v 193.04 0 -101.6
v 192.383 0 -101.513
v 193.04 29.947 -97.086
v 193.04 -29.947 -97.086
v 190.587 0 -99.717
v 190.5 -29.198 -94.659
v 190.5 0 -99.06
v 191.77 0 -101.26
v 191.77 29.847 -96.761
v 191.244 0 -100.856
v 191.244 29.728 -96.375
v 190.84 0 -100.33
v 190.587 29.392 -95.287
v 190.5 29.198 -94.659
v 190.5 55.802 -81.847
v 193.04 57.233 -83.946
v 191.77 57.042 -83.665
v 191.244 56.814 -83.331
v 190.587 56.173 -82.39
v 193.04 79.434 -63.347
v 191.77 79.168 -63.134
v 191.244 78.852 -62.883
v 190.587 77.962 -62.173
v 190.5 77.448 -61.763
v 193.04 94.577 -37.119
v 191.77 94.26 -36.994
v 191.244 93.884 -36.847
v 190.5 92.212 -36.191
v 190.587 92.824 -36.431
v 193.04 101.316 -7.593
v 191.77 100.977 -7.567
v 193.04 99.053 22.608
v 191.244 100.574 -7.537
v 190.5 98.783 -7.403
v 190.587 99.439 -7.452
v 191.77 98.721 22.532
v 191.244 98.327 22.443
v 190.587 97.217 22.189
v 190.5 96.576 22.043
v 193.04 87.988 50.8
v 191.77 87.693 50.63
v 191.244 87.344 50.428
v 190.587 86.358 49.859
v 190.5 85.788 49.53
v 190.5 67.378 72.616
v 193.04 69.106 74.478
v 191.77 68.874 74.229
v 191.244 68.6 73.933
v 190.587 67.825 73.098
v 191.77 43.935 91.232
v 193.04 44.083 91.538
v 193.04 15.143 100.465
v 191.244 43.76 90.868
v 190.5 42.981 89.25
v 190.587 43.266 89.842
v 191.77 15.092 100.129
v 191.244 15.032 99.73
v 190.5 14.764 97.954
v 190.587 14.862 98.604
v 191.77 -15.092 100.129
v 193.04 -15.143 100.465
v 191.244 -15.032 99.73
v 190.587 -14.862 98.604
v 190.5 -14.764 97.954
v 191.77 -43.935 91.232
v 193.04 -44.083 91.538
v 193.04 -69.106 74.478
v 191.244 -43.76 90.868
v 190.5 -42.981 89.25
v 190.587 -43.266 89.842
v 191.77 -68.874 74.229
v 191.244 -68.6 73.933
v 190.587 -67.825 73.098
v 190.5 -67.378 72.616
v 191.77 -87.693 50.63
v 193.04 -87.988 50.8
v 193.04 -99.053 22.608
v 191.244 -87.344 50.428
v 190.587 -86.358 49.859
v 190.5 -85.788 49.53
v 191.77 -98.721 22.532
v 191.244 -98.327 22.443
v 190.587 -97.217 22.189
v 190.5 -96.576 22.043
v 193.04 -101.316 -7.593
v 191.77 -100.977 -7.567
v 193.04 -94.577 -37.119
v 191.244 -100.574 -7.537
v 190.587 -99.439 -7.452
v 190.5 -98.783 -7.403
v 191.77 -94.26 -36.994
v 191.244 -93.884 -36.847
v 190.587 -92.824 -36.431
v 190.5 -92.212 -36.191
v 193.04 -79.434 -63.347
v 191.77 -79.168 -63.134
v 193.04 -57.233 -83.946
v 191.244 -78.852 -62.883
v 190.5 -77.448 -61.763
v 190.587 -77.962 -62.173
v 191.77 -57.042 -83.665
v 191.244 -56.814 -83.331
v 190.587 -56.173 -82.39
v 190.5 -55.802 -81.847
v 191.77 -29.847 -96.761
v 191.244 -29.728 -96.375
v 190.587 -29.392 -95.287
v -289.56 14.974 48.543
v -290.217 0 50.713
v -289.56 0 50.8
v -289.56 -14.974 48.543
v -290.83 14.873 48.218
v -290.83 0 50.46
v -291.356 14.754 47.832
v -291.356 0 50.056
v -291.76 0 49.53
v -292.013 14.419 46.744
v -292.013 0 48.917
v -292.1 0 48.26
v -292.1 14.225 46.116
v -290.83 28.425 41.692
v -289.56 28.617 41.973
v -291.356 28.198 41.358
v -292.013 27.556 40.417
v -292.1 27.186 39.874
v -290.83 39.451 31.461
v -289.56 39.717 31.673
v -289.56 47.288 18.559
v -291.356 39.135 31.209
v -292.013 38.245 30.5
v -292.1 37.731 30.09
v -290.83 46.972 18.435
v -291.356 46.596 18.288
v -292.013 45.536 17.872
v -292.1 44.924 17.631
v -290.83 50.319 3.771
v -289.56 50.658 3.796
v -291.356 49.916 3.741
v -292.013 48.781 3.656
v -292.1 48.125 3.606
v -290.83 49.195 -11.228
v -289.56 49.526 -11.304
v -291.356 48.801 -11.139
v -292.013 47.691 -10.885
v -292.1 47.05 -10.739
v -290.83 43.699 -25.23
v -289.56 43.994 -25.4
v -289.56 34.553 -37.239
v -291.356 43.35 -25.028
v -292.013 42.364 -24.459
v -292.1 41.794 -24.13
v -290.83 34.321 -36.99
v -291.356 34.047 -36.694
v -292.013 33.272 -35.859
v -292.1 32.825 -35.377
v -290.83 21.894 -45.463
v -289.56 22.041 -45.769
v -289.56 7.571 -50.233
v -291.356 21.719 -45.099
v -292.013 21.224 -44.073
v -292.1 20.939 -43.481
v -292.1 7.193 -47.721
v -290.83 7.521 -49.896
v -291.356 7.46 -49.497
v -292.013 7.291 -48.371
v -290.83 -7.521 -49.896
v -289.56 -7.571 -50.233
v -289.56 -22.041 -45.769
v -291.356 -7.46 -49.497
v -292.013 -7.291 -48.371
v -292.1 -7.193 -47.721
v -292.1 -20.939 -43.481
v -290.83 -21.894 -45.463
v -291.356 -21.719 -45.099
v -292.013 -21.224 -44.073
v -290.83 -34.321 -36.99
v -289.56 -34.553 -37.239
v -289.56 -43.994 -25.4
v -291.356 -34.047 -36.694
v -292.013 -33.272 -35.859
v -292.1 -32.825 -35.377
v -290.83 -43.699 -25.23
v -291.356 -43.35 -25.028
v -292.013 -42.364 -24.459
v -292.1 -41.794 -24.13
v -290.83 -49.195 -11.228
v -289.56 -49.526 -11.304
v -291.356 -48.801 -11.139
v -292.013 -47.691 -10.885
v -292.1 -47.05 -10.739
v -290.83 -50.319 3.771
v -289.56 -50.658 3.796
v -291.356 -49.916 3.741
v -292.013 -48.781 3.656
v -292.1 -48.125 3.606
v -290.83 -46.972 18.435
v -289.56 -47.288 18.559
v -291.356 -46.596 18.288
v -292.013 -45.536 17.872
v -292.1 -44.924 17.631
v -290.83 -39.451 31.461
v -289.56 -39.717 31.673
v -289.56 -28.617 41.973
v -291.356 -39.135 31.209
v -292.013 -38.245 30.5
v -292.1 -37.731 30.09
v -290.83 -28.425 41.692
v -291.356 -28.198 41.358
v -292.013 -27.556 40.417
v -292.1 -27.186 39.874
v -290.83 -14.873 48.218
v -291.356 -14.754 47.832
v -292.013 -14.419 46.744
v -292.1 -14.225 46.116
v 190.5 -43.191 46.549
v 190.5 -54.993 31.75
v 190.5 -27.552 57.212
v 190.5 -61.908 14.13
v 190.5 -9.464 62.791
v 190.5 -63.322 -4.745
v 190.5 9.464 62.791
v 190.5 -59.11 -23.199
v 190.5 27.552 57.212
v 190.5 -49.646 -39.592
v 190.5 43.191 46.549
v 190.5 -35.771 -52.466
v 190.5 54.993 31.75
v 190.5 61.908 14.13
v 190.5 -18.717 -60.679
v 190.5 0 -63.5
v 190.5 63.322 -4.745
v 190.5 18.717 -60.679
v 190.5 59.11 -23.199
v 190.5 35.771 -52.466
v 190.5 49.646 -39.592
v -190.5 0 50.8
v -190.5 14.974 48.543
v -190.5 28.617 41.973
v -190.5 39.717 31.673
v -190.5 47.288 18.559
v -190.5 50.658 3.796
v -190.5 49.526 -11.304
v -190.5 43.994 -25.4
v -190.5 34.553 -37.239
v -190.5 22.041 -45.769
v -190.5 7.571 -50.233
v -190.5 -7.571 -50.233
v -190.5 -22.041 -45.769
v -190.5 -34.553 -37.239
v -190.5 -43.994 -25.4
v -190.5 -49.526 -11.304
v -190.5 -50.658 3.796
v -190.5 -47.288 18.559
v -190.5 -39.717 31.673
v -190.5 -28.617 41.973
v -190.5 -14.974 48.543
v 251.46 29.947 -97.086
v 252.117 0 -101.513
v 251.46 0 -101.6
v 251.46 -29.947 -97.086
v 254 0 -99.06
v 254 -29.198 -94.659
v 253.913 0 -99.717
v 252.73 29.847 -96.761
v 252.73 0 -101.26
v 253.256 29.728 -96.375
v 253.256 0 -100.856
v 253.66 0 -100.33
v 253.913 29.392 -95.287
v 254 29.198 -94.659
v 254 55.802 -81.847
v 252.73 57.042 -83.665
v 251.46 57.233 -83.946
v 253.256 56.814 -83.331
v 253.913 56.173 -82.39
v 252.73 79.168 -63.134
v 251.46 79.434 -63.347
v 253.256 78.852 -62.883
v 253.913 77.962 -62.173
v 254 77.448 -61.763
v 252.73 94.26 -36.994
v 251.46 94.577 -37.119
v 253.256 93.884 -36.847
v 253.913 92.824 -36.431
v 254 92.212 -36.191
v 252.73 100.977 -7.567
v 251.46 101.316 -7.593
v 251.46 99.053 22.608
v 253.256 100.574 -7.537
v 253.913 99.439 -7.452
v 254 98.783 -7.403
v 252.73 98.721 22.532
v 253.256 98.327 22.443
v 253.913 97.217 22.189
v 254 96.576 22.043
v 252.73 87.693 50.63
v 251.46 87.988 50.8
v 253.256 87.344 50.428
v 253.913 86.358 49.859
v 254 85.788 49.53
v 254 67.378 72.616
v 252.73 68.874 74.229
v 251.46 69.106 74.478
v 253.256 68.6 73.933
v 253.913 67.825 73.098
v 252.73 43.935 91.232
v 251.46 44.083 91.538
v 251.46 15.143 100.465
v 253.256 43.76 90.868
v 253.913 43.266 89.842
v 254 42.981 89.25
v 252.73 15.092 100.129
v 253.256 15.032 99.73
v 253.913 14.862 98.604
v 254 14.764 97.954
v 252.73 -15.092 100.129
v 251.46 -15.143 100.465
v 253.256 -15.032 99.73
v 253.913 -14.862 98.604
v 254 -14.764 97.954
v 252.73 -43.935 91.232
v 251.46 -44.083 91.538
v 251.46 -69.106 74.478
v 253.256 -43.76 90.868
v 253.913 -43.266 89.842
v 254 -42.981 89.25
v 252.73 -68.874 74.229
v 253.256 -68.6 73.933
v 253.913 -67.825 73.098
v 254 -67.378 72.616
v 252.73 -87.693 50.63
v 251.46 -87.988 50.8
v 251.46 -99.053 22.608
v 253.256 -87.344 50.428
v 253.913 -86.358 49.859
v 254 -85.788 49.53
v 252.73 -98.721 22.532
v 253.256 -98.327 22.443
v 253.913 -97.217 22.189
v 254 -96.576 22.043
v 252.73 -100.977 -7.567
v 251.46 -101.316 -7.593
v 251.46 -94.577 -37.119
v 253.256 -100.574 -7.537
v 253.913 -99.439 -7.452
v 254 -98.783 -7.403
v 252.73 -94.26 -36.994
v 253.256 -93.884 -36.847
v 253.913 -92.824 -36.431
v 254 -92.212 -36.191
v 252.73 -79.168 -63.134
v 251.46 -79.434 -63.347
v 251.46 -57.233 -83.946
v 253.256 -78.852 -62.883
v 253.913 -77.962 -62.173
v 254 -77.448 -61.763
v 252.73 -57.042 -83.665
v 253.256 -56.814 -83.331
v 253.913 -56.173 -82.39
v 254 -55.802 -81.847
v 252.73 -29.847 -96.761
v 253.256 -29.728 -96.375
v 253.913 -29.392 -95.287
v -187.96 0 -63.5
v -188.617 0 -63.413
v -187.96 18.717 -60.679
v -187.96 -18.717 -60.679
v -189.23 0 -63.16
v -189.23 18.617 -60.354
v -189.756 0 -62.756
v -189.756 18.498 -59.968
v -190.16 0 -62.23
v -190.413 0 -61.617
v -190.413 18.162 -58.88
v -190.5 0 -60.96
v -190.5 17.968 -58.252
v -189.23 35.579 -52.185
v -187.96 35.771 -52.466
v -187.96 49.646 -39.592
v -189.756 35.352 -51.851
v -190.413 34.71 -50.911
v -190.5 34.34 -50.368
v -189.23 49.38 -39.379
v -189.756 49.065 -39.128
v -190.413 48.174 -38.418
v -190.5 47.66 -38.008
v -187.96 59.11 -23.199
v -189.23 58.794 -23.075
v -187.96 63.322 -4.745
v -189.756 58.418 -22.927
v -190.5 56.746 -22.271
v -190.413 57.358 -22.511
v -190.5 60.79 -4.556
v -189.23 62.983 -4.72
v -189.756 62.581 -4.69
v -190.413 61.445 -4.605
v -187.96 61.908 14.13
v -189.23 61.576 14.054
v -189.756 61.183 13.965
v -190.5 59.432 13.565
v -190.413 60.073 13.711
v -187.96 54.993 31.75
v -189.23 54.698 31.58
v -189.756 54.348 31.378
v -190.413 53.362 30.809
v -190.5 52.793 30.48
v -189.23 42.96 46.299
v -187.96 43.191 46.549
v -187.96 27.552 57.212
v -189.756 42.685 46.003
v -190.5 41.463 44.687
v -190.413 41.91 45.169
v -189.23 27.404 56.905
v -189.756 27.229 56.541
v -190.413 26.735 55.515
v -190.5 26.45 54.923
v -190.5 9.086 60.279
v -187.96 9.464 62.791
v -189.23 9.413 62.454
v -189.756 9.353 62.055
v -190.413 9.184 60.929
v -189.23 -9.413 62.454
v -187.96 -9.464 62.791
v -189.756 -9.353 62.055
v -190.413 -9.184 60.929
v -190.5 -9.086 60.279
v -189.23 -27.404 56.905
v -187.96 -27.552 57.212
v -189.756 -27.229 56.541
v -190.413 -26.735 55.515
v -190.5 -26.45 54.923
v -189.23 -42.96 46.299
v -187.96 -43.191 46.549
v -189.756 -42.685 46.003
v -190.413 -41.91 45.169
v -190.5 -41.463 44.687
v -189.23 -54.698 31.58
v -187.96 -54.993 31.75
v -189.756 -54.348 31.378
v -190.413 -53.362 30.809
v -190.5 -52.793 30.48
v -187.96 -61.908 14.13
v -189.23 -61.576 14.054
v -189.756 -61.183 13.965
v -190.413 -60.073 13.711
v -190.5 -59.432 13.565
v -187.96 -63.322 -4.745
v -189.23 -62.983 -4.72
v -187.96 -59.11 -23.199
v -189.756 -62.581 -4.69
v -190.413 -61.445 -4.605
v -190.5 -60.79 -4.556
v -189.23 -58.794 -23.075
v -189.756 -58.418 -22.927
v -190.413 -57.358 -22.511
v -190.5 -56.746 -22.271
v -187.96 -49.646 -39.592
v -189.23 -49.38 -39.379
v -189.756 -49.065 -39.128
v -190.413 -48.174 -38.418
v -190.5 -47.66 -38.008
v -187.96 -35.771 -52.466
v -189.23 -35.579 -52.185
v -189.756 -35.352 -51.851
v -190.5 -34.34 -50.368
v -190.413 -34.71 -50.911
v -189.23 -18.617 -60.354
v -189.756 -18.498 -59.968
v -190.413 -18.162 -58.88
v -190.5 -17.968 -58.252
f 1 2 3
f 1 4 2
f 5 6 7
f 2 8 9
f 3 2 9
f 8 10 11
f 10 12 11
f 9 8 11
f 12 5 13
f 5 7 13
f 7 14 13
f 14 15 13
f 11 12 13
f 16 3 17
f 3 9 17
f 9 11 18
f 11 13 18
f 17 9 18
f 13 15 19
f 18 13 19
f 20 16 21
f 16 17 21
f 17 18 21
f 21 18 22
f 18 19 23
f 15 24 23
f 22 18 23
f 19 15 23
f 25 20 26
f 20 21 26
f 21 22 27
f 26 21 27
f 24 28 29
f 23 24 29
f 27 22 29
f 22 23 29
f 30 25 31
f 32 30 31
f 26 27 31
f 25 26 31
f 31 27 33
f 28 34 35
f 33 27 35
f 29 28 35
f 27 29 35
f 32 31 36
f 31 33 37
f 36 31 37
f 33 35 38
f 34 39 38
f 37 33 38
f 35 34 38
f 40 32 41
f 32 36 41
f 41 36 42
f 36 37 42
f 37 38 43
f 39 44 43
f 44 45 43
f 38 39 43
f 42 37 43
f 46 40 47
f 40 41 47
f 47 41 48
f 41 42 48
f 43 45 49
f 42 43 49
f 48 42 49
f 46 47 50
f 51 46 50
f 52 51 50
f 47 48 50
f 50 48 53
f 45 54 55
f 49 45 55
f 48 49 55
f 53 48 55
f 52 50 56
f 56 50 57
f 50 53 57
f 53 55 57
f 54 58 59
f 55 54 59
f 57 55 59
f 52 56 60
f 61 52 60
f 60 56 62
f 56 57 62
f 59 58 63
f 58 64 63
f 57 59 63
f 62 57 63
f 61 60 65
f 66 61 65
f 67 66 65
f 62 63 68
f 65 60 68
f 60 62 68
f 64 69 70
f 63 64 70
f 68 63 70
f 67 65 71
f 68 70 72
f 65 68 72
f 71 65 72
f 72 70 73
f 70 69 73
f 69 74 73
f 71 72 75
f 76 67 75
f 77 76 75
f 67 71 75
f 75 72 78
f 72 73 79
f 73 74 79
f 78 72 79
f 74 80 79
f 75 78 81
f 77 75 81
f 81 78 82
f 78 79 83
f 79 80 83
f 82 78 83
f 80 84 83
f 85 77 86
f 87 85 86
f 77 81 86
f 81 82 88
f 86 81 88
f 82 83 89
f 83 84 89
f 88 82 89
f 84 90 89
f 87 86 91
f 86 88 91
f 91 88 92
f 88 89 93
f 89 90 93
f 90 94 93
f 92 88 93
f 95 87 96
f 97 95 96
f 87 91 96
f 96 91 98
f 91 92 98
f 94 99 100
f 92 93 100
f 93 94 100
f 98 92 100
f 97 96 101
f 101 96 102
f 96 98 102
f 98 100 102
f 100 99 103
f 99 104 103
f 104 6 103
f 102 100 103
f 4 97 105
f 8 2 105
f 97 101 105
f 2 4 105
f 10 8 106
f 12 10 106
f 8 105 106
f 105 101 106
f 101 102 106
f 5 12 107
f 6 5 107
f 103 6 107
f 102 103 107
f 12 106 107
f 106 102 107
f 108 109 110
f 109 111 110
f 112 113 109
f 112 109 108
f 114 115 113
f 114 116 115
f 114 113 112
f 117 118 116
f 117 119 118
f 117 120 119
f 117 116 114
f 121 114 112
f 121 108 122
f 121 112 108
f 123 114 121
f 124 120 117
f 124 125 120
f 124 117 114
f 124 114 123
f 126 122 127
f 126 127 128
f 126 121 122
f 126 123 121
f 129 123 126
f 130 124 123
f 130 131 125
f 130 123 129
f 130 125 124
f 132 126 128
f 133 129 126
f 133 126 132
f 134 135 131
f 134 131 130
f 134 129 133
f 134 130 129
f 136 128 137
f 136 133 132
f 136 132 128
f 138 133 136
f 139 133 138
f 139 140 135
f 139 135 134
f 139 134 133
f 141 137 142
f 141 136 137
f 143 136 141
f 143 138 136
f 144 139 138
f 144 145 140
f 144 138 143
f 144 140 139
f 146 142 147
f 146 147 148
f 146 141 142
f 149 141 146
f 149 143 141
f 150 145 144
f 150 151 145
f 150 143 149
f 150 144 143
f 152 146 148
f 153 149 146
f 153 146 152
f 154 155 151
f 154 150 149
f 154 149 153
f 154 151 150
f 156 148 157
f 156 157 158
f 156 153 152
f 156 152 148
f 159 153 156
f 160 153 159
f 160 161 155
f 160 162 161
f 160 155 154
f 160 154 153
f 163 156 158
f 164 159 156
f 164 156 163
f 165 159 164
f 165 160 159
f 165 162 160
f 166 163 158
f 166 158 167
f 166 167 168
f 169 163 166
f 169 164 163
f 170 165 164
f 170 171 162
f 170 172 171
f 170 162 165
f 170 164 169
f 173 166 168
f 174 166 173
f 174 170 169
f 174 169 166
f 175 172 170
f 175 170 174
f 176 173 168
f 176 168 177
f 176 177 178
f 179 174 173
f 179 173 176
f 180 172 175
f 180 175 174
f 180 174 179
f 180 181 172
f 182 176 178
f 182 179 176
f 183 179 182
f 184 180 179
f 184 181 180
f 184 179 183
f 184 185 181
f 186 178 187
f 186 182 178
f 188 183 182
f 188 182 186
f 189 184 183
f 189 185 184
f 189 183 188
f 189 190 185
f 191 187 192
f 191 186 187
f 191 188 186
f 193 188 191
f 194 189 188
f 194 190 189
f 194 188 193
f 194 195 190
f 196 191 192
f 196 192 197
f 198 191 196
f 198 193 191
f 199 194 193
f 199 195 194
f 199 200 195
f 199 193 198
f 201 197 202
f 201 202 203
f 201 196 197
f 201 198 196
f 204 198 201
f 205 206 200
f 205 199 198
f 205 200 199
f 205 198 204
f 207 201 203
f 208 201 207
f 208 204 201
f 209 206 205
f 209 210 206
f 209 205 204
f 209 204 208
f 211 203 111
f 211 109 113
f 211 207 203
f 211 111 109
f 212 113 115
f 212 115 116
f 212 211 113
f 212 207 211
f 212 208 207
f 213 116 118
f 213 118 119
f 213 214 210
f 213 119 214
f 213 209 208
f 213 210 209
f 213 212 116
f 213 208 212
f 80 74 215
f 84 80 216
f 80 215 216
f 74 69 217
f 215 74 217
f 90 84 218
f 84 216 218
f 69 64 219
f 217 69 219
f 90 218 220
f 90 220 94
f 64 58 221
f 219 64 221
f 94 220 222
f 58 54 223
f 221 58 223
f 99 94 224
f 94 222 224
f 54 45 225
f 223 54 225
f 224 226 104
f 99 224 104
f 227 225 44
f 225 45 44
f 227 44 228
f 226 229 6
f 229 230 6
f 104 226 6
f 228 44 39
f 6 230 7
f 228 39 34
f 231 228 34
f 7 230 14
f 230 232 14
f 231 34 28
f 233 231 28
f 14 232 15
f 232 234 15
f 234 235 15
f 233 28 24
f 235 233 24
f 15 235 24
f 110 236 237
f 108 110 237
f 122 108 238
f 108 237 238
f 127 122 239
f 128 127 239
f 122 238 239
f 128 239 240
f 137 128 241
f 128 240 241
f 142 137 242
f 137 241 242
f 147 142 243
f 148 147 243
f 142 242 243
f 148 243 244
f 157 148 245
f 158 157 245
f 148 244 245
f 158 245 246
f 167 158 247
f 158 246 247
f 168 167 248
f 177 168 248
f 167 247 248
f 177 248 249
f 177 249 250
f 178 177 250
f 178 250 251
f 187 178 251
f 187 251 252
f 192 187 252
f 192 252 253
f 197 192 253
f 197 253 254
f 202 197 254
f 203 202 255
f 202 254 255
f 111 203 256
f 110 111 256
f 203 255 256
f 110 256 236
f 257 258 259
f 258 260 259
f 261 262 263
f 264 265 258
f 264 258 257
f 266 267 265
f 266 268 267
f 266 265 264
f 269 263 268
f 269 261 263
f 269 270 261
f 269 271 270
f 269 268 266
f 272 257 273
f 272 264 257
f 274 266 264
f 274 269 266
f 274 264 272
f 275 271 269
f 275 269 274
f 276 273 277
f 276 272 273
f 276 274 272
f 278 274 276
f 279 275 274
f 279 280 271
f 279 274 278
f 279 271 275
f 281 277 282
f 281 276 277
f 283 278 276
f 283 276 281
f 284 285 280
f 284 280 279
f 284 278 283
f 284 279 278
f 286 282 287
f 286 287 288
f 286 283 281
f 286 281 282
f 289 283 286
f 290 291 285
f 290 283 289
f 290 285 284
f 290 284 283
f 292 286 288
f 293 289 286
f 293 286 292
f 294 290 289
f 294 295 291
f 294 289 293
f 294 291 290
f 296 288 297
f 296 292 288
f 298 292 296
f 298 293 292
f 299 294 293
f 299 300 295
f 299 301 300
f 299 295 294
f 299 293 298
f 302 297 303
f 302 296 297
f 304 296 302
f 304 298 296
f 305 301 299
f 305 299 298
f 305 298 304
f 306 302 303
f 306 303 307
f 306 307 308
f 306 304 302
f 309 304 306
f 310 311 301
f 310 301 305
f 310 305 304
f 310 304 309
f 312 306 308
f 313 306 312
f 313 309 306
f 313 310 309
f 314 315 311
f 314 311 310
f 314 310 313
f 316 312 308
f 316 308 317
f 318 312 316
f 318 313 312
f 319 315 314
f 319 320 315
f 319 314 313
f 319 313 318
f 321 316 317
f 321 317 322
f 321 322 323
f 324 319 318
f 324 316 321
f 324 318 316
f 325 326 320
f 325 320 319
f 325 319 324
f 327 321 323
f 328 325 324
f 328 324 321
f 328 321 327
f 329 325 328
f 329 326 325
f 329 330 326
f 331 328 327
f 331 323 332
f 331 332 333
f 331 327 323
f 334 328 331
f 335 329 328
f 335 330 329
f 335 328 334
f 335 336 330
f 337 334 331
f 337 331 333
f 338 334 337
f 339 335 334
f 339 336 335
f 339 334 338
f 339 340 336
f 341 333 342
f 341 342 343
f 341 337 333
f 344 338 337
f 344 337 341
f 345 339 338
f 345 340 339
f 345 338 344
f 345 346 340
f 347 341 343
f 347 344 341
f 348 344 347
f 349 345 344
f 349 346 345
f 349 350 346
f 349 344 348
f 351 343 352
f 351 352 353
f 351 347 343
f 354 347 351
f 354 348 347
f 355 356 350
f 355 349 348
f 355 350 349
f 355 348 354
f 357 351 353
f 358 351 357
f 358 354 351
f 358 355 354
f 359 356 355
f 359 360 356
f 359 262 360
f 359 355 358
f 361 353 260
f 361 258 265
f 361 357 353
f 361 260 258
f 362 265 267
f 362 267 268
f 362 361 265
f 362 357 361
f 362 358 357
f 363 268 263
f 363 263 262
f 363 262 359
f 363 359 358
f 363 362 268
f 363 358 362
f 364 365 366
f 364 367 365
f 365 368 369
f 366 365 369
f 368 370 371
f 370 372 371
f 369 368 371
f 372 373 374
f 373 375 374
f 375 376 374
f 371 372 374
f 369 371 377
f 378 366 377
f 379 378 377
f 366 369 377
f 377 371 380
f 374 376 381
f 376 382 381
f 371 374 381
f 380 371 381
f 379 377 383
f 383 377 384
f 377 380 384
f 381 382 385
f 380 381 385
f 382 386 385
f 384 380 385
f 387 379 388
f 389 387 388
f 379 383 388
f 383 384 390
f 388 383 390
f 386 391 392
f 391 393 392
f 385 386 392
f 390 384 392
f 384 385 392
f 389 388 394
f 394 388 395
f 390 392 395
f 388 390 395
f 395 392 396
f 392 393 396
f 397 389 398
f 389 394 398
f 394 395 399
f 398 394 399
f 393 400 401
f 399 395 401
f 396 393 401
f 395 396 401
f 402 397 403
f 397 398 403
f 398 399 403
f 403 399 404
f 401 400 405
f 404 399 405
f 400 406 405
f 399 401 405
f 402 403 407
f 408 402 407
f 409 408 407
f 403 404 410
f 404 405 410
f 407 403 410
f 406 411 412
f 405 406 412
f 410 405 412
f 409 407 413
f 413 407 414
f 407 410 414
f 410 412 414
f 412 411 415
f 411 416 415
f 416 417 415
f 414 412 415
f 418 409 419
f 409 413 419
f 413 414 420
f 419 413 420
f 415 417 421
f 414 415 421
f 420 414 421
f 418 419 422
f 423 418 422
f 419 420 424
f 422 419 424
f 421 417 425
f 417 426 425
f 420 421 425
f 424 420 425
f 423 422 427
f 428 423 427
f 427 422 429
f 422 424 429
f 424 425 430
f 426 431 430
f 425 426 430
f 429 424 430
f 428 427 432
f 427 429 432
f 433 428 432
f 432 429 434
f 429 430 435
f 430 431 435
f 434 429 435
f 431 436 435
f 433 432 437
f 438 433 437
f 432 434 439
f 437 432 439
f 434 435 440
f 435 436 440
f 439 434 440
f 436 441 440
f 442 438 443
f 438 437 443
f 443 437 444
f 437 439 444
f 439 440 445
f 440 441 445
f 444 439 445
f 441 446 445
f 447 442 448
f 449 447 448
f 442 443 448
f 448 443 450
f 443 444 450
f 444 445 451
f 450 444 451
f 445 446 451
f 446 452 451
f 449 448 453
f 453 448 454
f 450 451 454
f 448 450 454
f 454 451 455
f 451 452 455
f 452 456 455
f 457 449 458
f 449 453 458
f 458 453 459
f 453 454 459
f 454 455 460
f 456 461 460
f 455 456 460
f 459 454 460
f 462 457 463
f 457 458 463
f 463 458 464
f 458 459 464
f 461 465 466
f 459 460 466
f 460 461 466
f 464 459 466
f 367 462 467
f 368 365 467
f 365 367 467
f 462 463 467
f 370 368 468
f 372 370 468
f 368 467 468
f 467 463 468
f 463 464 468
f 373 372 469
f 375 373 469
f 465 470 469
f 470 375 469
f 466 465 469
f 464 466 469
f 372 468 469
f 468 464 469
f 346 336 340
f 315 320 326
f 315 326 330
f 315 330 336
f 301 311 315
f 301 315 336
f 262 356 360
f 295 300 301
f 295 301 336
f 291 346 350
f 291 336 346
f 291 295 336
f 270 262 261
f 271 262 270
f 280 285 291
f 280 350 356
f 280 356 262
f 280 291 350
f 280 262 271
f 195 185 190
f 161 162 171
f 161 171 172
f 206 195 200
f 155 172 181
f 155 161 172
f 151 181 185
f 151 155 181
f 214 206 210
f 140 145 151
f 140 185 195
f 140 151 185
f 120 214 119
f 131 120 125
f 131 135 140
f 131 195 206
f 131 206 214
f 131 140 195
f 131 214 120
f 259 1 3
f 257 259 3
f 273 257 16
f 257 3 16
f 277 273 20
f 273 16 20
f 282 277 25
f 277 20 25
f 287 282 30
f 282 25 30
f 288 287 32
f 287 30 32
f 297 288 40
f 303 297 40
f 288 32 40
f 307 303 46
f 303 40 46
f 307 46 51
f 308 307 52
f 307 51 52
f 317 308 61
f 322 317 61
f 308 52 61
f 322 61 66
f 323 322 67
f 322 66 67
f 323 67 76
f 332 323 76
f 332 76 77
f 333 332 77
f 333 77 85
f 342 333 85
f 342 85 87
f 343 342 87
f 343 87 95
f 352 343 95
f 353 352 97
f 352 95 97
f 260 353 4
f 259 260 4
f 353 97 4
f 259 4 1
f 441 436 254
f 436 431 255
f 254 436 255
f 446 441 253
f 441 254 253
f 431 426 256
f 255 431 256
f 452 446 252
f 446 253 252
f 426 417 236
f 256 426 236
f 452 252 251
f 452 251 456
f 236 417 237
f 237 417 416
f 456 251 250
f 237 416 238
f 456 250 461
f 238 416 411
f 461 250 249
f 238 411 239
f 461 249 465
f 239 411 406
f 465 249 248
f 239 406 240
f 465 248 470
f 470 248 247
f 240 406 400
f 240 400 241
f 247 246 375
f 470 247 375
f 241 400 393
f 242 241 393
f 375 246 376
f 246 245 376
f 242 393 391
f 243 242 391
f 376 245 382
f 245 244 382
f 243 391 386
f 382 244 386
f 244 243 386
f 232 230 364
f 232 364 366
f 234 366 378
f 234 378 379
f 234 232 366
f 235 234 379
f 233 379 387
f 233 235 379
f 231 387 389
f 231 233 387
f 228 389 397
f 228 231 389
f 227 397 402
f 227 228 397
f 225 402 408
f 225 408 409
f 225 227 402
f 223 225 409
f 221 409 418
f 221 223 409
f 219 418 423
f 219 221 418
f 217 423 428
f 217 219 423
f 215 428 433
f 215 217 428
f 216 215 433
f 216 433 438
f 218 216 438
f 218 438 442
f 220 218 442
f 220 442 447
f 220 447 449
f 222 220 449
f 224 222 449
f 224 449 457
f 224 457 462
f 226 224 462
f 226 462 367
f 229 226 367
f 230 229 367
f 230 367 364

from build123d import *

# Parameters (mm, degrees)
SKETCH2_R           = 63.5
BOSS_EXTRUDE1_DEPTH = 190.5
SKETCH3_R           = 50.8
BOSS_EXTRUDE2_DEPTH = 101.6
SKETCH4_R           = 101.6
BOSS_EXTRUDE3_DEPTH = 63.5
FILLET1_R           = 2.54
FILLET2_R           = 2.54


with BuildPart() as part:
    # Sketch2 → Boss-Extrude1 (new, symmetric)
    with BuildSketch(Plane(origin=(0, 0, 0), x_dir=(0, 0, -1), z_dir=(1, 0, 0))):
        Circle(SKETCH2_R)
    extrude(amount=BOSS_EXTRUDE1_DEPTH, both=True)

    # Sketch3 → Boss-Extrude2 (add)
    with BuildSketch(Plane.ZY.offset(190.5)):
        Circle(SKETCH3_R)
    extrude(amount=BOSS_EXTRUDE2_DEPTH)

    # Sketch4 → Boss-Extrude3 (add)
    with BuildSketch(Plane(origin=(190.5, 0, 0), x_dir=(0, 0, -1), z_dir=(1, 0, 0))):
        Circle(SKETCH4_R)
    extrude(amount=BOSS_EXTRUDE3_DEPTH)

    # Fillet1
    fillet1_edges = [part.edges().sort_by_distance(p)[0] for p in [
        (254, 0, 101.6),
        (190.5, 0, 101.6),
    ]]
    fillet(fillet1_edges, radius=FILLET1_R)

    # Fillet2
    fillet2_edges = [part.edges().sort_by_distance(p)[0] for p in [
        (-190.5, 0, 63.5),
        (-292.1, 0, -50.8),
    ]]
    fillet(fillet2_edges, radius=FILLET2_R)


solid = part.part
